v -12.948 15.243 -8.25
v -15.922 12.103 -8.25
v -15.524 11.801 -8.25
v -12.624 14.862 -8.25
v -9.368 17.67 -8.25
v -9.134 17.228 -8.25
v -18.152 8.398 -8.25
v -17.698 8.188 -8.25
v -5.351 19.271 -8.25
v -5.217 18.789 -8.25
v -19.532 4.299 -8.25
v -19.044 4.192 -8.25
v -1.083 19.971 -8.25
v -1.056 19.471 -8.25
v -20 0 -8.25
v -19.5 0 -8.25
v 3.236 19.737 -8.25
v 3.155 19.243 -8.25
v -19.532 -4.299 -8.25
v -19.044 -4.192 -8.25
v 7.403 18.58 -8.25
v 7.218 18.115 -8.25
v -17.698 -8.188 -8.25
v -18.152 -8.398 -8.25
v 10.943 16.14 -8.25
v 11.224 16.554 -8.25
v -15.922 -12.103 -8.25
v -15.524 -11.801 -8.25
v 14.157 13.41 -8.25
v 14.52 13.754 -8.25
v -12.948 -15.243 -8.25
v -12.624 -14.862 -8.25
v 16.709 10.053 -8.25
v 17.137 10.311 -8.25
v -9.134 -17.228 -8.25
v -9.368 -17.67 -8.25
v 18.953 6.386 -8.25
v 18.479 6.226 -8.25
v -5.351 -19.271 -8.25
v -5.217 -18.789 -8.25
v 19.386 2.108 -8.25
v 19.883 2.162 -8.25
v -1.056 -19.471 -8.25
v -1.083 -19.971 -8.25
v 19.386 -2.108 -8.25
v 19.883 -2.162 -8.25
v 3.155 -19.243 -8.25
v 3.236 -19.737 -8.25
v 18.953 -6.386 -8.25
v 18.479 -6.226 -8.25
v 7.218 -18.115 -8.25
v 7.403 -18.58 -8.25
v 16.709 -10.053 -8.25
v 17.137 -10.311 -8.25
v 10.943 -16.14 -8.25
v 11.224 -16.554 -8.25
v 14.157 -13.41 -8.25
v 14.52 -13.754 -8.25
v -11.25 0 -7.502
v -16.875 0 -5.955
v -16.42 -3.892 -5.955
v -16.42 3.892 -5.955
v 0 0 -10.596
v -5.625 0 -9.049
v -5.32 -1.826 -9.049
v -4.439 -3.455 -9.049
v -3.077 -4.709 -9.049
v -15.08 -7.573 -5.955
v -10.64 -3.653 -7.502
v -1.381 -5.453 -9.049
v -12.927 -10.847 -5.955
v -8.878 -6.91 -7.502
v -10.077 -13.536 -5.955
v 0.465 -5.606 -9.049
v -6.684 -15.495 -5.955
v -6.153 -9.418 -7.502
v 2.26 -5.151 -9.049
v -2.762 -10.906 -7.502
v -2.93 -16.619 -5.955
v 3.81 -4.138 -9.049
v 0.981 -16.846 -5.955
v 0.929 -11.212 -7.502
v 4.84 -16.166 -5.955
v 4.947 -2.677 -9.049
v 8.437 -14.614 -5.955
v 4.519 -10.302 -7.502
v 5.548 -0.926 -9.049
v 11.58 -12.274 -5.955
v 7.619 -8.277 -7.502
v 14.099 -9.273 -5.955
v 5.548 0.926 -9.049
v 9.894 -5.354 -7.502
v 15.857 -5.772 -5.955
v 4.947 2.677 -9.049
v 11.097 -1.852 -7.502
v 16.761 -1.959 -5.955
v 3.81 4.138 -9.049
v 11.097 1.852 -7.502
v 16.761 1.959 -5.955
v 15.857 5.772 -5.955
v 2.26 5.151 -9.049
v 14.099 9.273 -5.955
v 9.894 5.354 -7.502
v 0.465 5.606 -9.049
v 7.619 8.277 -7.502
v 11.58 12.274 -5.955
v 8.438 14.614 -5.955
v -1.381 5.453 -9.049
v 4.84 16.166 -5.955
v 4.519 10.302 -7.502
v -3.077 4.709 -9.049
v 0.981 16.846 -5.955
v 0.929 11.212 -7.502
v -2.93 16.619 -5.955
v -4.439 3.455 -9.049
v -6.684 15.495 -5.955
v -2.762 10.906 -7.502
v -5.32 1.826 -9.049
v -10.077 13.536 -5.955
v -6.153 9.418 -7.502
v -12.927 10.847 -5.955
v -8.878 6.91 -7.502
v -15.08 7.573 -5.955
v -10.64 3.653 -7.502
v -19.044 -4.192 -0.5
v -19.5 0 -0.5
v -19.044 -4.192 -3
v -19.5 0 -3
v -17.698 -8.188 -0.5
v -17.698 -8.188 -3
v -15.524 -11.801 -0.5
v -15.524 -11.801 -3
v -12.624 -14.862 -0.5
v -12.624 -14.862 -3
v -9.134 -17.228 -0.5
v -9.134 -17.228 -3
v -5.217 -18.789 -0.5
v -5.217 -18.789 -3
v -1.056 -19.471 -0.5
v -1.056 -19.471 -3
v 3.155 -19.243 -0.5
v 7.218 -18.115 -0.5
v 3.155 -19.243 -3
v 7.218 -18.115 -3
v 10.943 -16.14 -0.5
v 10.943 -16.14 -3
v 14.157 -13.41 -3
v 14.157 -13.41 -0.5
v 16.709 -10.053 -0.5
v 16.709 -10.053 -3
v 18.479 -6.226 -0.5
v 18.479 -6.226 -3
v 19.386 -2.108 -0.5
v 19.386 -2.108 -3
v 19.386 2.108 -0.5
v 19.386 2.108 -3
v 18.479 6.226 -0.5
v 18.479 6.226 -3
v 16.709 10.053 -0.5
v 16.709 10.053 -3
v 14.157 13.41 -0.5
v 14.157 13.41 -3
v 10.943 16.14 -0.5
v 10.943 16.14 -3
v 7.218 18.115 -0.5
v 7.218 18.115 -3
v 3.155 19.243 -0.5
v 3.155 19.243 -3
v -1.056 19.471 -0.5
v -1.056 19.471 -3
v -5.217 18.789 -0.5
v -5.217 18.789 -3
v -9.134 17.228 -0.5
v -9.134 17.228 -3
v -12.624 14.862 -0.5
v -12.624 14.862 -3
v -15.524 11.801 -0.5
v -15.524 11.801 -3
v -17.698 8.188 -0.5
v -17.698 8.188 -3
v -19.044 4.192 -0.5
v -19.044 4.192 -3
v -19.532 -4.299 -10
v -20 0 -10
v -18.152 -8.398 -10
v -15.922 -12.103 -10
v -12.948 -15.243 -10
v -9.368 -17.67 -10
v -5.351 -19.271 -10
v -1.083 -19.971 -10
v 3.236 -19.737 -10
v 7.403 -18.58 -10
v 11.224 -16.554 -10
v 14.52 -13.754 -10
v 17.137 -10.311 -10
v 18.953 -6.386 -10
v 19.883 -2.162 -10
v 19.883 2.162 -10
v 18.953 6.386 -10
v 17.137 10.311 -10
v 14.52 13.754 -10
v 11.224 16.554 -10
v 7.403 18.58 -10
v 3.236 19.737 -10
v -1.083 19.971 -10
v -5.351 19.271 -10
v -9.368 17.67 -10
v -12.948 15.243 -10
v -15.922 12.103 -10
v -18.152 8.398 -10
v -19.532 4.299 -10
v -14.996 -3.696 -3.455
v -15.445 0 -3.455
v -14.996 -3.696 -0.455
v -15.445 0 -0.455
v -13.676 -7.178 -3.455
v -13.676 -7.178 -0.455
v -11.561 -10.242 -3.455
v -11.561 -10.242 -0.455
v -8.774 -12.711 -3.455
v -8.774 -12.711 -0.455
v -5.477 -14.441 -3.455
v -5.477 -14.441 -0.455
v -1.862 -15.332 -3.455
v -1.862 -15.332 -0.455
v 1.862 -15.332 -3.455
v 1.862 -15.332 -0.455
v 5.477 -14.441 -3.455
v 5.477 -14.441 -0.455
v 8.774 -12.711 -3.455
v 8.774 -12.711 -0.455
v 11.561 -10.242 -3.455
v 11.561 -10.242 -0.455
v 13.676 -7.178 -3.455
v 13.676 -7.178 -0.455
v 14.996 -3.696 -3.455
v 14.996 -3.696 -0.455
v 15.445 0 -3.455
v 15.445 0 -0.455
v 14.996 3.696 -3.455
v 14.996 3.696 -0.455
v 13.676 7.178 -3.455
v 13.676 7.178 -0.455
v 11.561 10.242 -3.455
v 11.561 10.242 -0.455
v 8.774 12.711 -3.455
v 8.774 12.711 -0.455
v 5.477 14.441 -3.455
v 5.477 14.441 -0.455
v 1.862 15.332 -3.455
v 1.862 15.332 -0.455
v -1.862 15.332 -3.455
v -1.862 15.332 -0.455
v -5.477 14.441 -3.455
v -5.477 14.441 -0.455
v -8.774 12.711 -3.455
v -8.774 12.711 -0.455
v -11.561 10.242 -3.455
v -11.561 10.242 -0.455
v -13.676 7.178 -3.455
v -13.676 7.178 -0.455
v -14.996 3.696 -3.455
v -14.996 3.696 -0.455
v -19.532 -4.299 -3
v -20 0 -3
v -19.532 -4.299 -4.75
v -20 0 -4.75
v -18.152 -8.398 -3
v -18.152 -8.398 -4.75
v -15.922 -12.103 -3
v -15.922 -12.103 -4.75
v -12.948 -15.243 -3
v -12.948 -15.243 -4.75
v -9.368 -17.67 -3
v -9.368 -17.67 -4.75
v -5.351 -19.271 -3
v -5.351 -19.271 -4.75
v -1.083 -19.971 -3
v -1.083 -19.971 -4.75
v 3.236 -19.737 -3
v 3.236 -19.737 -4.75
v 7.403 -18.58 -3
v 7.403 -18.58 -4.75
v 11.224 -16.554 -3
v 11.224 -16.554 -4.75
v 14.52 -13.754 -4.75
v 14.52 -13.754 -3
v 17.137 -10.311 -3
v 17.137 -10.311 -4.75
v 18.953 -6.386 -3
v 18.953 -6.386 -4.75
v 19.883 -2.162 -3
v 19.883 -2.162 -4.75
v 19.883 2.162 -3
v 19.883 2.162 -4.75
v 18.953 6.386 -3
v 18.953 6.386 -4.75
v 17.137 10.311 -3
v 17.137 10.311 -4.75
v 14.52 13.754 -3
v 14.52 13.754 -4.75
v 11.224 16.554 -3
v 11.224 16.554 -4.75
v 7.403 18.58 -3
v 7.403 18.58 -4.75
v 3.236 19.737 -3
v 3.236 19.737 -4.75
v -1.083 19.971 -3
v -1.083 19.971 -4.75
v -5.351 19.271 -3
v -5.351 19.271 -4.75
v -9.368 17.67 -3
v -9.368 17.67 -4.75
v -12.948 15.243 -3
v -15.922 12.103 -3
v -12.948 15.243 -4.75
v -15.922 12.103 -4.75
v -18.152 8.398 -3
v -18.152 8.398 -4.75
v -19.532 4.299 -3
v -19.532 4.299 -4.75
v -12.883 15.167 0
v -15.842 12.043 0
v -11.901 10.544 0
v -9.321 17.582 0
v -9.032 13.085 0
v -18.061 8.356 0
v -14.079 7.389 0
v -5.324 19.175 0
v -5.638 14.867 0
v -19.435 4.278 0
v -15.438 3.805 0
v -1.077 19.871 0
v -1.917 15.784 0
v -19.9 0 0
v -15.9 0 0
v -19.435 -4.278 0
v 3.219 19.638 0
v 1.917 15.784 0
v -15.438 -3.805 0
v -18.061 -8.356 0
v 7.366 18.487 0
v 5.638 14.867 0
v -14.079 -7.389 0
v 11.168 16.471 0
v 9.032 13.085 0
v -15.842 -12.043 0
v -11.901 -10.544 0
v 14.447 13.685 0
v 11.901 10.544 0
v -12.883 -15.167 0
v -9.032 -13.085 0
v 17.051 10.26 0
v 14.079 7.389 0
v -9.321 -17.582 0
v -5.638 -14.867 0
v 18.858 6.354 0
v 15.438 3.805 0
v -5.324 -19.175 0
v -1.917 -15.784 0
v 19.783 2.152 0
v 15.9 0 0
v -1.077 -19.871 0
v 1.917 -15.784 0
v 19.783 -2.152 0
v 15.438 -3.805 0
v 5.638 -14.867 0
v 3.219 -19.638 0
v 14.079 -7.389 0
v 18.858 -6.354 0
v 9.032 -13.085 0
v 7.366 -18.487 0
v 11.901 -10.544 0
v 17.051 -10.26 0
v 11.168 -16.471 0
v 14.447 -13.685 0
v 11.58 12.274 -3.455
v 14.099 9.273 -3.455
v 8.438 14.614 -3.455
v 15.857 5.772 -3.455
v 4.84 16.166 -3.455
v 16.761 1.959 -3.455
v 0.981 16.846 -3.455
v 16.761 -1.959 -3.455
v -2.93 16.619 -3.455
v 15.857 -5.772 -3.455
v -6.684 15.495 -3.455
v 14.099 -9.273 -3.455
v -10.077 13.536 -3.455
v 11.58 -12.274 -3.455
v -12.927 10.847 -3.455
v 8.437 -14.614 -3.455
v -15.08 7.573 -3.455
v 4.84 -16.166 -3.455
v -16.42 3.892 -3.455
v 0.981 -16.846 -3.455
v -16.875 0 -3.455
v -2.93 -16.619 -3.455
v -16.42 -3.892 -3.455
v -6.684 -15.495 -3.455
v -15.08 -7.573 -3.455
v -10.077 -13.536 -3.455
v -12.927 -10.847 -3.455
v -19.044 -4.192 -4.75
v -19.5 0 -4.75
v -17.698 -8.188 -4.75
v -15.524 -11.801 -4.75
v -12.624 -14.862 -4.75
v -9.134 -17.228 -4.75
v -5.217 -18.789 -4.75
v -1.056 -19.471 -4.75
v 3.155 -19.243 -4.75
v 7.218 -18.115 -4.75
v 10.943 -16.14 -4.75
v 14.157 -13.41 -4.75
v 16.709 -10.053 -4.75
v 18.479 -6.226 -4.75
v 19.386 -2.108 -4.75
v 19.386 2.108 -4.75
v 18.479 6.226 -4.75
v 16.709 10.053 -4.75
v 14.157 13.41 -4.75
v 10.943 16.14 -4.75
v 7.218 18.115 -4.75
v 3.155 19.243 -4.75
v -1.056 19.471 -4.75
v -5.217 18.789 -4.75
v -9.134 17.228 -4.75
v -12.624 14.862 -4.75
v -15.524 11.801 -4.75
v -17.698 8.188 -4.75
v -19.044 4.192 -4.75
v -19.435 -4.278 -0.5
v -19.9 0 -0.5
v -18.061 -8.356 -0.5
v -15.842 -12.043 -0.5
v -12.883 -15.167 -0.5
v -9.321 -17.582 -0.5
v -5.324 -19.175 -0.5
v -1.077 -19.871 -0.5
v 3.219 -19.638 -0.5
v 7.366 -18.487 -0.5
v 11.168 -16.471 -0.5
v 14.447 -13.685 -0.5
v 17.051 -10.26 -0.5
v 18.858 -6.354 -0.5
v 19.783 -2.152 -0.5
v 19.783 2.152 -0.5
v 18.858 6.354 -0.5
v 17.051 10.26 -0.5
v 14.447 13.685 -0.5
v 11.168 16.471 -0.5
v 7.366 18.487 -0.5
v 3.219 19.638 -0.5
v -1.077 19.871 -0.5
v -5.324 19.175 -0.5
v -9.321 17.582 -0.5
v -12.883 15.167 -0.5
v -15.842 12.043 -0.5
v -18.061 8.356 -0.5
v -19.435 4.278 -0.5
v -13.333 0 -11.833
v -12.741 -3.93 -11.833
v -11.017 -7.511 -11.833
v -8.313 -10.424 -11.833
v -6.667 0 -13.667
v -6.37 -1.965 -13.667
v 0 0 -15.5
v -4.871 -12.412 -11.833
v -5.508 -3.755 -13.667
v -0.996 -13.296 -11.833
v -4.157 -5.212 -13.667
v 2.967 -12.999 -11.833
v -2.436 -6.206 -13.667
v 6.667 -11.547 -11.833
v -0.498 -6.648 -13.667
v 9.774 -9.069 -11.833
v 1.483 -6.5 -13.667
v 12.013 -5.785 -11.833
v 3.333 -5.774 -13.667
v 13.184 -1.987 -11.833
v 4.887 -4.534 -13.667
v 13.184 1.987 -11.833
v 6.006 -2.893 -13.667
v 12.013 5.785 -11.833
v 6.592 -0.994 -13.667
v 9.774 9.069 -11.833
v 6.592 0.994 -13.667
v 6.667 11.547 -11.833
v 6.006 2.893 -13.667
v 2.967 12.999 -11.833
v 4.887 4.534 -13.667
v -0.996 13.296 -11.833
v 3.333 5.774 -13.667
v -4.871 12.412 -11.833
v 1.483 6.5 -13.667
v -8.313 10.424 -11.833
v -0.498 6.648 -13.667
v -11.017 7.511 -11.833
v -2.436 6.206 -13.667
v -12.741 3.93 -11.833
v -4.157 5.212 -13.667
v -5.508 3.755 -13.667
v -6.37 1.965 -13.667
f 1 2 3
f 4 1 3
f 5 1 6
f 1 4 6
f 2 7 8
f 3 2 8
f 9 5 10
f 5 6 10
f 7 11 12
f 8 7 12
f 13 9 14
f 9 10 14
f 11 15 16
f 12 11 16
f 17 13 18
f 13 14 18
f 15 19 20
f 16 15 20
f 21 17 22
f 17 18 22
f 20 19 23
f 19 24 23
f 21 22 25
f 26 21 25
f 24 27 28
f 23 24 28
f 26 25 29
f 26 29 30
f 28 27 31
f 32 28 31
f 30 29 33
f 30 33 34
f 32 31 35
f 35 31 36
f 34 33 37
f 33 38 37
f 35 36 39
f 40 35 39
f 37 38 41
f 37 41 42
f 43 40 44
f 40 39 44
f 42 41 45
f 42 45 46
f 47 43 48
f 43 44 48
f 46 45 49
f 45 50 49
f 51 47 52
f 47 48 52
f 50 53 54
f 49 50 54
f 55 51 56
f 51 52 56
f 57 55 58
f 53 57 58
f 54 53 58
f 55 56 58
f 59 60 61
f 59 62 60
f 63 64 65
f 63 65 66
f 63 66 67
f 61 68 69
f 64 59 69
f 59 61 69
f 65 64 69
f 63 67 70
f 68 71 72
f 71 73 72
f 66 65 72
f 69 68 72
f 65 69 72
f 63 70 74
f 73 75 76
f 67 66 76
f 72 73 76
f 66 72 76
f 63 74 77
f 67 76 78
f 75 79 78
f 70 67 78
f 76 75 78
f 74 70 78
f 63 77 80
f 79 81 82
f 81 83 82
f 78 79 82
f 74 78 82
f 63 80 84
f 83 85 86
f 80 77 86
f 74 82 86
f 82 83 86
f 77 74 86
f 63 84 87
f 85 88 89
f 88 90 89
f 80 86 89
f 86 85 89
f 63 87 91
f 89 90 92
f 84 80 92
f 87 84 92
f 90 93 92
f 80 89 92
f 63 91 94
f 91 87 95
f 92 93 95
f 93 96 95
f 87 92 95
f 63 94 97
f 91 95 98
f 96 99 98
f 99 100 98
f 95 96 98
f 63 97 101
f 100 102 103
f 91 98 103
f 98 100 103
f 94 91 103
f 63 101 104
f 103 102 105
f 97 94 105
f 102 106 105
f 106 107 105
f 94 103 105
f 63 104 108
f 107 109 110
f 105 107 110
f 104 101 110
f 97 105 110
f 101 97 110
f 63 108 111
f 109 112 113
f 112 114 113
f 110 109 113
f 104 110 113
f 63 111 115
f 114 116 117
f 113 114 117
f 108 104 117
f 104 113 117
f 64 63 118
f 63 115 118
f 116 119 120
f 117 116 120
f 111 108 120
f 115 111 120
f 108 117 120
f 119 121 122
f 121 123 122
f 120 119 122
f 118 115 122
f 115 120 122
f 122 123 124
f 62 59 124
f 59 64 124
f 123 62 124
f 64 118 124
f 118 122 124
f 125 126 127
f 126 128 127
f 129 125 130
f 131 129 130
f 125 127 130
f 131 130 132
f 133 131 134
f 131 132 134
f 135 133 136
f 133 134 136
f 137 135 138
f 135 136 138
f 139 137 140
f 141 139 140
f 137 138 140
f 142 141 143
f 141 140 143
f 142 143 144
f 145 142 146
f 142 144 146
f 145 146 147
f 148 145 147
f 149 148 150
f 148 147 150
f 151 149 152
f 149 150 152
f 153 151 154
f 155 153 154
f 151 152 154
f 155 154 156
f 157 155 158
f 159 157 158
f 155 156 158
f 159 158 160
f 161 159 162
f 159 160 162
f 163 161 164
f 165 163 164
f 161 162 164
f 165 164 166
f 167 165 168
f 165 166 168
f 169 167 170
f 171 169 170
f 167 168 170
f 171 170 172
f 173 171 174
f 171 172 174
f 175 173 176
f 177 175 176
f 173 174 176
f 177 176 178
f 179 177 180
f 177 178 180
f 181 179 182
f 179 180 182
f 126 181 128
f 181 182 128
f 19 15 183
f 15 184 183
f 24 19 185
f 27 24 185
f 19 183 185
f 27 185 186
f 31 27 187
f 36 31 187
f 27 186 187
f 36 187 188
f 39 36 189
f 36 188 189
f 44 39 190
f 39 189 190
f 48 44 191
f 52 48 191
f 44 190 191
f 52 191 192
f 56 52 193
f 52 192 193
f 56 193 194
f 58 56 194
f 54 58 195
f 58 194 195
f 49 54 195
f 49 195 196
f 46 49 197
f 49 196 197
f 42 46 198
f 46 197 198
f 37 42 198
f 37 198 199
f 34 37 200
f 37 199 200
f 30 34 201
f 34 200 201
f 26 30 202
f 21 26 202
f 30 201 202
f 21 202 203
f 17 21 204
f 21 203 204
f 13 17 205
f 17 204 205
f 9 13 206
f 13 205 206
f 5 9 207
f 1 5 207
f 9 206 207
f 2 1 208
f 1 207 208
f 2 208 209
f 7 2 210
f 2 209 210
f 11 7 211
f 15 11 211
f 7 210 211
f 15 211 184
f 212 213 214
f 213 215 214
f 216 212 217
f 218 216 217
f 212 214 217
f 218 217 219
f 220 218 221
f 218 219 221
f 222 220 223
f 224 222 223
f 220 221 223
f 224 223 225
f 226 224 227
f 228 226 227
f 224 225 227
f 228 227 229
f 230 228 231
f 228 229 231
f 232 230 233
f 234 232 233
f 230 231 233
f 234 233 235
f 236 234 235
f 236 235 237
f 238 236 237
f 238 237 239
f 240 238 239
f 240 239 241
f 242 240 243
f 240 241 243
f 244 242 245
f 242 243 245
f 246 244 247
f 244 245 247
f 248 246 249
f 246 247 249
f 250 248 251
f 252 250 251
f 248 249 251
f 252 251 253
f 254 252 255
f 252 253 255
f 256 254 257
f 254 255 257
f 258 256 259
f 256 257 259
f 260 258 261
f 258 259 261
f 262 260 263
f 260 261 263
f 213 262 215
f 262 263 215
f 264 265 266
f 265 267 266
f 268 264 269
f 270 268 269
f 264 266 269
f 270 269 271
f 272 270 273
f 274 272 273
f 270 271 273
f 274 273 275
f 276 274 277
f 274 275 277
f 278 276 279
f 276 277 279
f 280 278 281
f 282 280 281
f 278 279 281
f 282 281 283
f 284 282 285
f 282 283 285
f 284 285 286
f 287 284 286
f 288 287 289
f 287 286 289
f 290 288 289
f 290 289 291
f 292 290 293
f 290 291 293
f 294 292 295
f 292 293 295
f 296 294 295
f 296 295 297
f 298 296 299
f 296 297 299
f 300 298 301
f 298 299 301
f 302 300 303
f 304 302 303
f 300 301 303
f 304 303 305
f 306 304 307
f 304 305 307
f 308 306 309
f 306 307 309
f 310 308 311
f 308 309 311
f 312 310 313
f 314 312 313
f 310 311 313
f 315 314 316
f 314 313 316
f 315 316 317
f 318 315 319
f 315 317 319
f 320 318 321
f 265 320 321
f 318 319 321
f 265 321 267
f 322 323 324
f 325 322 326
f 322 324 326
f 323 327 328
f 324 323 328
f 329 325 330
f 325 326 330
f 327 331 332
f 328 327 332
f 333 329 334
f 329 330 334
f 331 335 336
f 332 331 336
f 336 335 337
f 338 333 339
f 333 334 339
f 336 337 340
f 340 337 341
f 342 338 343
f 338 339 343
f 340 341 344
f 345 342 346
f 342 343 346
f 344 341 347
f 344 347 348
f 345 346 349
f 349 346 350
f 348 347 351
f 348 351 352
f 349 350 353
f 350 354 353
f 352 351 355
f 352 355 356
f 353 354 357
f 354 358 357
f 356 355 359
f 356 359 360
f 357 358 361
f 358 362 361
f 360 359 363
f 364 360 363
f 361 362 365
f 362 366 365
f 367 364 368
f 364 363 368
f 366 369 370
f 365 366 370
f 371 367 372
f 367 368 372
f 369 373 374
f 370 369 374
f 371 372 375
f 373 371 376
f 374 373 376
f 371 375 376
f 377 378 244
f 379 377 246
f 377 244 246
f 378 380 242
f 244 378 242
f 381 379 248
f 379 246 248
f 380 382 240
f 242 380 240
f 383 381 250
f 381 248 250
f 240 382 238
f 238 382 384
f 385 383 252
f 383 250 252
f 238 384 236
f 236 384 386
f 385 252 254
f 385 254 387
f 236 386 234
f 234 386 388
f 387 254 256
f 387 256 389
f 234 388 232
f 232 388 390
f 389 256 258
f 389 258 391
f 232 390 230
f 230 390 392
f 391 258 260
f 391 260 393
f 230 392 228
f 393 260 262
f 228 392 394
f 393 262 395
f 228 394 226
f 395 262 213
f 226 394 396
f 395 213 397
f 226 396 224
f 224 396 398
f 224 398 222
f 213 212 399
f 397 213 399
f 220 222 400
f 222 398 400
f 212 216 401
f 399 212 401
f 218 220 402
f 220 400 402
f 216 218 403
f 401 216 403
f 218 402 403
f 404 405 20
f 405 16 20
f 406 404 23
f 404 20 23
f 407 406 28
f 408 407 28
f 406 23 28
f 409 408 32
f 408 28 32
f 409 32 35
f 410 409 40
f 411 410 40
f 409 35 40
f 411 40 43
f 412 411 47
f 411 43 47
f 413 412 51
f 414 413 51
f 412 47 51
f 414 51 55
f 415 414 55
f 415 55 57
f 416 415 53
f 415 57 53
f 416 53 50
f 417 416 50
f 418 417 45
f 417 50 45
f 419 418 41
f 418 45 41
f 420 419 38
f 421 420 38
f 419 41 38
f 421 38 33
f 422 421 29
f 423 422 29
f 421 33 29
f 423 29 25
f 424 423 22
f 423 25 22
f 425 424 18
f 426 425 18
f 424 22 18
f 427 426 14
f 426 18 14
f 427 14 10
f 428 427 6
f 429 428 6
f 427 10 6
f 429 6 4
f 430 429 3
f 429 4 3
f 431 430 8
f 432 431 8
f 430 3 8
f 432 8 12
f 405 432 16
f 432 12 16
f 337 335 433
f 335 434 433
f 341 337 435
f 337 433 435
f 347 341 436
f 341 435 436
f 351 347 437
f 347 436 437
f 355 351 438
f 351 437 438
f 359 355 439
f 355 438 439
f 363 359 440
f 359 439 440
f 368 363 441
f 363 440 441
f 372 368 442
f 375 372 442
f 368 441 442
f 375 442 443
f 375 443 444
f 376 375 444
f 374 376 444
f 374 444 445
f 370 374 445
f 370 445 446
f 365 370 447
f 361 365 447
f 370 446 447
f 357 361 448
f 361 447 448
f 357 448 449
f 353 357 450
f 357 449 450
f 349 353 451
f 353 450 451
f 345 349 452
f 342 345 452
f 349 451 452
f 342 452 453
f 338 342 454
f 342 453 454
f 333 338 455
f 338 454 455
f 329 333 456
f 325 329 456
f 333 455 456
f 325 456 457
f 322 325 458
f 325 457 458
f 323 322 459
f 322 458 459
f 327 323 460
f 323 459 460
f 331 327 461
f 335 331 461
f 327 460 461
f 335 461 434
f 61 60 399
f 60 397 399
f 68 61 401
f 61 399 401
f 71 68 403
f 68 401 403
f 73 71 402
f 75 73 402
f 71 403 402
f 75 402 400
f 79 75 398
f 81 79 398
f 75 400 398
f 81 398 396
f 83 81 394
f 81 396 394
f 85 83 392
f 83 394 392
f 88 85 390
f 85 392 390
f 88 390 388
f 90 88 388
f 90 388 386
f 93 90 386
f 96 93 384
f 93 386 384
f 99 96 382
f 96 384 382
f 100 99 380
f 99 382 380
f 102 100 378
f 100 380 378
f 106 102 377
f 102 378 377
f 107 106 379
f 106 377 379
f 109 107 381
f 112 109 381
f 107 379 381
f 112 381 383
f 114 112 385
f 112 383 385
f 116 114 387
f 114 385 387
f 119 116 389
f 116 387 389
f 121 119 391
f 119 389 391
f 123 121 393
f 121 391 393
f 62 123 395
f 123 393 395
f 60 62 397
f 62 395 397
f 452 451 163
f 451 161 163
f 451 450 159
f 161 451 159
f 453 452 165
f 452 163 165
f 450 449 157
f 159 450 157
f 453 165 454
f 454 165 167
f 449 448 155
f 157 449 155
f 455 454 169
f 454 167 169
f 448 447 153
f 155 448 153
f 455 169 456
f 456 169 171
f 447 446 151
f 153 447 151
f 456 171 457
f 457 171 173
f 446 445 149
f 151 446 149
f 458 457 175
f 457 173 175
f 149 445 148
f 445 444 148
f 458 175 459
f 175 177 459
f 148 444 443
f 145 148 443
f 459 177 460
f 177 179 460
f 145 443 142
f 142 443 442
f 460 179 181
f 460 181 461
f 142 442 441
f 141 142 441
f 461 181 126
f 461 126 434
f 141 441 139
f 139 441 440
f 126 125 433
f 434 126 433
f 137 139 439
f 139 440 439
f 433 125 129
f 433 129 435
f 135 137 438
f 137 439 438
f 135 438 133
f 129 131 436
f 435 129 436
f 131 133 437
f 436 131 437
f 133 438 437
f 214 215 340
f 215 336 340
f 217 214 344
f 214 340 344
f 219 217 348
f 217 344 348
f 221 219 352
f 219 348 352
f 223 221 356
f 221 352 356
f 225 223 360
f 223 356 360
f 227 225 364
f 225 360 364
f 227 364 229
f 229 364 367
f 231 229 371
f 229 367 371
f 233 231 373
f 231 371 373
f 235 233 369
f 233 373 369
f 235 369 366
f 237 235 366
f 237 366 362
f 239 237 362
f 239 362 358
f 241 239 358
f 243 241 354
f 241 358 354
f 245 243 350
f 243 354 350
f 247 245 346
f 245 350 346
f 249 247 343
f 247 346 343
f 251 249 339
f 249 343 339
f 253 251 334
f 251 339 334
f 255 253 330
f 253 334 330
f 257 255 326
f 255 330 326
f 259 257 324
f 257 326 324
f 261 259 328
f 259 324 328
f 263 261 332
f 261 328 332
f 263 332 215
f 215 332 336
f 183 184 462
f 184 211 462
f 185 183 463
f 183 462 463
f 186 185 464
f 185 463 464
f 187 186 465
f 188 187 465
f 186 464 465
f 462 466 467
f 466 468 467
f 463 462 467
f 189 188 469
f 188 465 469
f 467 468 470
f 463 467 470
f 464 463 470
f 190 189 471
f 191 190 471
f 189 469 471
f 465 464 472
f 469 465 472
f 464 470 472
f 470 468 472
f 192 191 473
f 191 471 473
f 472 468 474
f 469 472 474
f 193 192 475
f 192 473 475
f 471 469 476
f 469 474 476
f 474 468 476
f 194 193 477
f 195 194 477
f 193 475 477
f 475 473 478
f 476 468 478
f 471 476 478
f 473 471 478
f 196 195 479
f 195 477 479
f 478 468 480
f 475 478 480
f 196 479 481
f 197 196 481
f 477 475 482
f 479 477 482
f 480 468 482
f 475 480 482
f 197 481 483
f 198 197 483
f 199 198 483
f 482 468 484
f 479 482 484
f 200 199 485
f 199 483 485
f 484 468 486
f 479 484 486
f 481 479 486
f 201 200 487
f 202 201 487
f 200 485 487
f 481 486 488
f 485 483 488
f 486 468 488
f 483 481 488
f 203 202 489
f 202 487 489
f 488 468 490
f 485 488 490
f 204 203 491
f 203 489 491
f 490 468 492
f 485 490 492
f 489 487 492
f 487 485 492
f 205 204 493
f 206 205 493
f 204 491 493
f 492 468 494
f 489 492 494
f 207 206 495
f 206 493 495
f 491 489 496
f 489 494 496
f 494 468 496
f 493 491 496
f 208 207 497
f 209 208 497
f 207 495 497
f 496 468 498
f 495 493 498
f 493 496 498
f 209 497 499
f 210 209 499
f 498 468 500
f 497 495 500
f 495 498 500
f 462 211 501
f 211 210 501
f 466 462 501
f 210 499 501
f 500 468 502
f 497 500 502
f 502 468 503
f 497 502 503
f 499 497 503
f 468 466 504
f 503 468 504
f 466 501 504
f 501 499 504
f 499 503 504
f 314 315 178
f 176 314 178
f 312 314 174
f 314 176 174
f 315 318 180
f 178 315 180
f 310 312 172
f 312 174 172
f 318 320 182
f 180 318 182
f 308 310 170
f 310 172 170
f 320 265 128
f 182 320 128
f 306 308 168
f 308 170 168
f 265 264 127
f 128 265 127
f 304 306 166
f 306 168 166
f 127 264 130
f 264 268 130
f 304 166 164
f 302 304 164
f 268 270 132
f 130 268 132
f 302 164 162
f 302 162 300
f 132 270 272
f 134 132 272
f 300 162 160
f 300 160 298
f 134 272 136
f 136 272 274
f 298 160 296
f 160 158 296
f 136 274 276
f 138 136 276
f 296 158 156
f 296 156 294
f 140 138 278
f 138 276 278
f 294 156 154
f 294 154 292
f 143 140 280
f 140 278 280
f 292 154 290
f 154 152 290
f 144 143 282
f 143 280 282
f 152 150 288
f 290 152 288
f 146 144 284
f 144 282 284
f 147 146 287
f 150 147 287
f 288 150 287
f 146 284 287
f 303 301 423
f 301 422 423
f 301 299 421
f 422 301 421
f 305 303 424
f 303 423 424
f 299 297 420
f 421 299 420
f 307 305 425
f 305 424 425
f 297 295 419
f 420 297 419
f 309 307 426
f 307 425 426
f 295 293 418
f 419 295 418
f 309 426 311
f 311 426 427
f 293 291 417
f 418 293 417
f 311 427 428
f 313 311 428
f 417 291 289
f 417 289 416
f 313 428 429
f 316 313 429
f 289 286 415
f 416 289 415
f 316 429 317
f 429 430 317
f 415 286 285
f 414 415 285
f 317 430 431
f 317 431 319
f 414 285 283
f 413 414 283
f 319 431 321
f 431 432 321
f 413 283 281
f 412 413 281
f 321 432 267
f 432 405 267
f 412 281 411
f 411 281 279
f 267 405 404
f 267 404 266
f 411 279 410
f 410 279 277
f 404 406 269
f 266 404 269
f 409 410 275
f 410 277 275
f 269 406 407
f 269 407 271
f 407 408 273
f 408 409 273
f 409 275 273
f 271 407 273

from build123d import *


with BuildPart() as f1:
    # F0 (on Front) → F1 (revolve)
    with BuildSketch(Plane.XZ):
        Polygon((-15.9, 0), (-19.9, 0), (-19.9, -0.5), (-19.5, -0.5), (-19.5, -3), (-20, -3), (-20, -4.75), (-19.5, -4.75), (-19.5, -8.25), (-20, -8.25), (-20, -10), (0, -15.5), (0, -10.595625), (-16.875, -5.955), (-16.875, -3.455), (-15.445, -3.455), (-15.445, -0.455), align=None)
    revolve(axis=Axis((0, 0, -13.047812), (0, 0, 1)))


solid = f1.part
